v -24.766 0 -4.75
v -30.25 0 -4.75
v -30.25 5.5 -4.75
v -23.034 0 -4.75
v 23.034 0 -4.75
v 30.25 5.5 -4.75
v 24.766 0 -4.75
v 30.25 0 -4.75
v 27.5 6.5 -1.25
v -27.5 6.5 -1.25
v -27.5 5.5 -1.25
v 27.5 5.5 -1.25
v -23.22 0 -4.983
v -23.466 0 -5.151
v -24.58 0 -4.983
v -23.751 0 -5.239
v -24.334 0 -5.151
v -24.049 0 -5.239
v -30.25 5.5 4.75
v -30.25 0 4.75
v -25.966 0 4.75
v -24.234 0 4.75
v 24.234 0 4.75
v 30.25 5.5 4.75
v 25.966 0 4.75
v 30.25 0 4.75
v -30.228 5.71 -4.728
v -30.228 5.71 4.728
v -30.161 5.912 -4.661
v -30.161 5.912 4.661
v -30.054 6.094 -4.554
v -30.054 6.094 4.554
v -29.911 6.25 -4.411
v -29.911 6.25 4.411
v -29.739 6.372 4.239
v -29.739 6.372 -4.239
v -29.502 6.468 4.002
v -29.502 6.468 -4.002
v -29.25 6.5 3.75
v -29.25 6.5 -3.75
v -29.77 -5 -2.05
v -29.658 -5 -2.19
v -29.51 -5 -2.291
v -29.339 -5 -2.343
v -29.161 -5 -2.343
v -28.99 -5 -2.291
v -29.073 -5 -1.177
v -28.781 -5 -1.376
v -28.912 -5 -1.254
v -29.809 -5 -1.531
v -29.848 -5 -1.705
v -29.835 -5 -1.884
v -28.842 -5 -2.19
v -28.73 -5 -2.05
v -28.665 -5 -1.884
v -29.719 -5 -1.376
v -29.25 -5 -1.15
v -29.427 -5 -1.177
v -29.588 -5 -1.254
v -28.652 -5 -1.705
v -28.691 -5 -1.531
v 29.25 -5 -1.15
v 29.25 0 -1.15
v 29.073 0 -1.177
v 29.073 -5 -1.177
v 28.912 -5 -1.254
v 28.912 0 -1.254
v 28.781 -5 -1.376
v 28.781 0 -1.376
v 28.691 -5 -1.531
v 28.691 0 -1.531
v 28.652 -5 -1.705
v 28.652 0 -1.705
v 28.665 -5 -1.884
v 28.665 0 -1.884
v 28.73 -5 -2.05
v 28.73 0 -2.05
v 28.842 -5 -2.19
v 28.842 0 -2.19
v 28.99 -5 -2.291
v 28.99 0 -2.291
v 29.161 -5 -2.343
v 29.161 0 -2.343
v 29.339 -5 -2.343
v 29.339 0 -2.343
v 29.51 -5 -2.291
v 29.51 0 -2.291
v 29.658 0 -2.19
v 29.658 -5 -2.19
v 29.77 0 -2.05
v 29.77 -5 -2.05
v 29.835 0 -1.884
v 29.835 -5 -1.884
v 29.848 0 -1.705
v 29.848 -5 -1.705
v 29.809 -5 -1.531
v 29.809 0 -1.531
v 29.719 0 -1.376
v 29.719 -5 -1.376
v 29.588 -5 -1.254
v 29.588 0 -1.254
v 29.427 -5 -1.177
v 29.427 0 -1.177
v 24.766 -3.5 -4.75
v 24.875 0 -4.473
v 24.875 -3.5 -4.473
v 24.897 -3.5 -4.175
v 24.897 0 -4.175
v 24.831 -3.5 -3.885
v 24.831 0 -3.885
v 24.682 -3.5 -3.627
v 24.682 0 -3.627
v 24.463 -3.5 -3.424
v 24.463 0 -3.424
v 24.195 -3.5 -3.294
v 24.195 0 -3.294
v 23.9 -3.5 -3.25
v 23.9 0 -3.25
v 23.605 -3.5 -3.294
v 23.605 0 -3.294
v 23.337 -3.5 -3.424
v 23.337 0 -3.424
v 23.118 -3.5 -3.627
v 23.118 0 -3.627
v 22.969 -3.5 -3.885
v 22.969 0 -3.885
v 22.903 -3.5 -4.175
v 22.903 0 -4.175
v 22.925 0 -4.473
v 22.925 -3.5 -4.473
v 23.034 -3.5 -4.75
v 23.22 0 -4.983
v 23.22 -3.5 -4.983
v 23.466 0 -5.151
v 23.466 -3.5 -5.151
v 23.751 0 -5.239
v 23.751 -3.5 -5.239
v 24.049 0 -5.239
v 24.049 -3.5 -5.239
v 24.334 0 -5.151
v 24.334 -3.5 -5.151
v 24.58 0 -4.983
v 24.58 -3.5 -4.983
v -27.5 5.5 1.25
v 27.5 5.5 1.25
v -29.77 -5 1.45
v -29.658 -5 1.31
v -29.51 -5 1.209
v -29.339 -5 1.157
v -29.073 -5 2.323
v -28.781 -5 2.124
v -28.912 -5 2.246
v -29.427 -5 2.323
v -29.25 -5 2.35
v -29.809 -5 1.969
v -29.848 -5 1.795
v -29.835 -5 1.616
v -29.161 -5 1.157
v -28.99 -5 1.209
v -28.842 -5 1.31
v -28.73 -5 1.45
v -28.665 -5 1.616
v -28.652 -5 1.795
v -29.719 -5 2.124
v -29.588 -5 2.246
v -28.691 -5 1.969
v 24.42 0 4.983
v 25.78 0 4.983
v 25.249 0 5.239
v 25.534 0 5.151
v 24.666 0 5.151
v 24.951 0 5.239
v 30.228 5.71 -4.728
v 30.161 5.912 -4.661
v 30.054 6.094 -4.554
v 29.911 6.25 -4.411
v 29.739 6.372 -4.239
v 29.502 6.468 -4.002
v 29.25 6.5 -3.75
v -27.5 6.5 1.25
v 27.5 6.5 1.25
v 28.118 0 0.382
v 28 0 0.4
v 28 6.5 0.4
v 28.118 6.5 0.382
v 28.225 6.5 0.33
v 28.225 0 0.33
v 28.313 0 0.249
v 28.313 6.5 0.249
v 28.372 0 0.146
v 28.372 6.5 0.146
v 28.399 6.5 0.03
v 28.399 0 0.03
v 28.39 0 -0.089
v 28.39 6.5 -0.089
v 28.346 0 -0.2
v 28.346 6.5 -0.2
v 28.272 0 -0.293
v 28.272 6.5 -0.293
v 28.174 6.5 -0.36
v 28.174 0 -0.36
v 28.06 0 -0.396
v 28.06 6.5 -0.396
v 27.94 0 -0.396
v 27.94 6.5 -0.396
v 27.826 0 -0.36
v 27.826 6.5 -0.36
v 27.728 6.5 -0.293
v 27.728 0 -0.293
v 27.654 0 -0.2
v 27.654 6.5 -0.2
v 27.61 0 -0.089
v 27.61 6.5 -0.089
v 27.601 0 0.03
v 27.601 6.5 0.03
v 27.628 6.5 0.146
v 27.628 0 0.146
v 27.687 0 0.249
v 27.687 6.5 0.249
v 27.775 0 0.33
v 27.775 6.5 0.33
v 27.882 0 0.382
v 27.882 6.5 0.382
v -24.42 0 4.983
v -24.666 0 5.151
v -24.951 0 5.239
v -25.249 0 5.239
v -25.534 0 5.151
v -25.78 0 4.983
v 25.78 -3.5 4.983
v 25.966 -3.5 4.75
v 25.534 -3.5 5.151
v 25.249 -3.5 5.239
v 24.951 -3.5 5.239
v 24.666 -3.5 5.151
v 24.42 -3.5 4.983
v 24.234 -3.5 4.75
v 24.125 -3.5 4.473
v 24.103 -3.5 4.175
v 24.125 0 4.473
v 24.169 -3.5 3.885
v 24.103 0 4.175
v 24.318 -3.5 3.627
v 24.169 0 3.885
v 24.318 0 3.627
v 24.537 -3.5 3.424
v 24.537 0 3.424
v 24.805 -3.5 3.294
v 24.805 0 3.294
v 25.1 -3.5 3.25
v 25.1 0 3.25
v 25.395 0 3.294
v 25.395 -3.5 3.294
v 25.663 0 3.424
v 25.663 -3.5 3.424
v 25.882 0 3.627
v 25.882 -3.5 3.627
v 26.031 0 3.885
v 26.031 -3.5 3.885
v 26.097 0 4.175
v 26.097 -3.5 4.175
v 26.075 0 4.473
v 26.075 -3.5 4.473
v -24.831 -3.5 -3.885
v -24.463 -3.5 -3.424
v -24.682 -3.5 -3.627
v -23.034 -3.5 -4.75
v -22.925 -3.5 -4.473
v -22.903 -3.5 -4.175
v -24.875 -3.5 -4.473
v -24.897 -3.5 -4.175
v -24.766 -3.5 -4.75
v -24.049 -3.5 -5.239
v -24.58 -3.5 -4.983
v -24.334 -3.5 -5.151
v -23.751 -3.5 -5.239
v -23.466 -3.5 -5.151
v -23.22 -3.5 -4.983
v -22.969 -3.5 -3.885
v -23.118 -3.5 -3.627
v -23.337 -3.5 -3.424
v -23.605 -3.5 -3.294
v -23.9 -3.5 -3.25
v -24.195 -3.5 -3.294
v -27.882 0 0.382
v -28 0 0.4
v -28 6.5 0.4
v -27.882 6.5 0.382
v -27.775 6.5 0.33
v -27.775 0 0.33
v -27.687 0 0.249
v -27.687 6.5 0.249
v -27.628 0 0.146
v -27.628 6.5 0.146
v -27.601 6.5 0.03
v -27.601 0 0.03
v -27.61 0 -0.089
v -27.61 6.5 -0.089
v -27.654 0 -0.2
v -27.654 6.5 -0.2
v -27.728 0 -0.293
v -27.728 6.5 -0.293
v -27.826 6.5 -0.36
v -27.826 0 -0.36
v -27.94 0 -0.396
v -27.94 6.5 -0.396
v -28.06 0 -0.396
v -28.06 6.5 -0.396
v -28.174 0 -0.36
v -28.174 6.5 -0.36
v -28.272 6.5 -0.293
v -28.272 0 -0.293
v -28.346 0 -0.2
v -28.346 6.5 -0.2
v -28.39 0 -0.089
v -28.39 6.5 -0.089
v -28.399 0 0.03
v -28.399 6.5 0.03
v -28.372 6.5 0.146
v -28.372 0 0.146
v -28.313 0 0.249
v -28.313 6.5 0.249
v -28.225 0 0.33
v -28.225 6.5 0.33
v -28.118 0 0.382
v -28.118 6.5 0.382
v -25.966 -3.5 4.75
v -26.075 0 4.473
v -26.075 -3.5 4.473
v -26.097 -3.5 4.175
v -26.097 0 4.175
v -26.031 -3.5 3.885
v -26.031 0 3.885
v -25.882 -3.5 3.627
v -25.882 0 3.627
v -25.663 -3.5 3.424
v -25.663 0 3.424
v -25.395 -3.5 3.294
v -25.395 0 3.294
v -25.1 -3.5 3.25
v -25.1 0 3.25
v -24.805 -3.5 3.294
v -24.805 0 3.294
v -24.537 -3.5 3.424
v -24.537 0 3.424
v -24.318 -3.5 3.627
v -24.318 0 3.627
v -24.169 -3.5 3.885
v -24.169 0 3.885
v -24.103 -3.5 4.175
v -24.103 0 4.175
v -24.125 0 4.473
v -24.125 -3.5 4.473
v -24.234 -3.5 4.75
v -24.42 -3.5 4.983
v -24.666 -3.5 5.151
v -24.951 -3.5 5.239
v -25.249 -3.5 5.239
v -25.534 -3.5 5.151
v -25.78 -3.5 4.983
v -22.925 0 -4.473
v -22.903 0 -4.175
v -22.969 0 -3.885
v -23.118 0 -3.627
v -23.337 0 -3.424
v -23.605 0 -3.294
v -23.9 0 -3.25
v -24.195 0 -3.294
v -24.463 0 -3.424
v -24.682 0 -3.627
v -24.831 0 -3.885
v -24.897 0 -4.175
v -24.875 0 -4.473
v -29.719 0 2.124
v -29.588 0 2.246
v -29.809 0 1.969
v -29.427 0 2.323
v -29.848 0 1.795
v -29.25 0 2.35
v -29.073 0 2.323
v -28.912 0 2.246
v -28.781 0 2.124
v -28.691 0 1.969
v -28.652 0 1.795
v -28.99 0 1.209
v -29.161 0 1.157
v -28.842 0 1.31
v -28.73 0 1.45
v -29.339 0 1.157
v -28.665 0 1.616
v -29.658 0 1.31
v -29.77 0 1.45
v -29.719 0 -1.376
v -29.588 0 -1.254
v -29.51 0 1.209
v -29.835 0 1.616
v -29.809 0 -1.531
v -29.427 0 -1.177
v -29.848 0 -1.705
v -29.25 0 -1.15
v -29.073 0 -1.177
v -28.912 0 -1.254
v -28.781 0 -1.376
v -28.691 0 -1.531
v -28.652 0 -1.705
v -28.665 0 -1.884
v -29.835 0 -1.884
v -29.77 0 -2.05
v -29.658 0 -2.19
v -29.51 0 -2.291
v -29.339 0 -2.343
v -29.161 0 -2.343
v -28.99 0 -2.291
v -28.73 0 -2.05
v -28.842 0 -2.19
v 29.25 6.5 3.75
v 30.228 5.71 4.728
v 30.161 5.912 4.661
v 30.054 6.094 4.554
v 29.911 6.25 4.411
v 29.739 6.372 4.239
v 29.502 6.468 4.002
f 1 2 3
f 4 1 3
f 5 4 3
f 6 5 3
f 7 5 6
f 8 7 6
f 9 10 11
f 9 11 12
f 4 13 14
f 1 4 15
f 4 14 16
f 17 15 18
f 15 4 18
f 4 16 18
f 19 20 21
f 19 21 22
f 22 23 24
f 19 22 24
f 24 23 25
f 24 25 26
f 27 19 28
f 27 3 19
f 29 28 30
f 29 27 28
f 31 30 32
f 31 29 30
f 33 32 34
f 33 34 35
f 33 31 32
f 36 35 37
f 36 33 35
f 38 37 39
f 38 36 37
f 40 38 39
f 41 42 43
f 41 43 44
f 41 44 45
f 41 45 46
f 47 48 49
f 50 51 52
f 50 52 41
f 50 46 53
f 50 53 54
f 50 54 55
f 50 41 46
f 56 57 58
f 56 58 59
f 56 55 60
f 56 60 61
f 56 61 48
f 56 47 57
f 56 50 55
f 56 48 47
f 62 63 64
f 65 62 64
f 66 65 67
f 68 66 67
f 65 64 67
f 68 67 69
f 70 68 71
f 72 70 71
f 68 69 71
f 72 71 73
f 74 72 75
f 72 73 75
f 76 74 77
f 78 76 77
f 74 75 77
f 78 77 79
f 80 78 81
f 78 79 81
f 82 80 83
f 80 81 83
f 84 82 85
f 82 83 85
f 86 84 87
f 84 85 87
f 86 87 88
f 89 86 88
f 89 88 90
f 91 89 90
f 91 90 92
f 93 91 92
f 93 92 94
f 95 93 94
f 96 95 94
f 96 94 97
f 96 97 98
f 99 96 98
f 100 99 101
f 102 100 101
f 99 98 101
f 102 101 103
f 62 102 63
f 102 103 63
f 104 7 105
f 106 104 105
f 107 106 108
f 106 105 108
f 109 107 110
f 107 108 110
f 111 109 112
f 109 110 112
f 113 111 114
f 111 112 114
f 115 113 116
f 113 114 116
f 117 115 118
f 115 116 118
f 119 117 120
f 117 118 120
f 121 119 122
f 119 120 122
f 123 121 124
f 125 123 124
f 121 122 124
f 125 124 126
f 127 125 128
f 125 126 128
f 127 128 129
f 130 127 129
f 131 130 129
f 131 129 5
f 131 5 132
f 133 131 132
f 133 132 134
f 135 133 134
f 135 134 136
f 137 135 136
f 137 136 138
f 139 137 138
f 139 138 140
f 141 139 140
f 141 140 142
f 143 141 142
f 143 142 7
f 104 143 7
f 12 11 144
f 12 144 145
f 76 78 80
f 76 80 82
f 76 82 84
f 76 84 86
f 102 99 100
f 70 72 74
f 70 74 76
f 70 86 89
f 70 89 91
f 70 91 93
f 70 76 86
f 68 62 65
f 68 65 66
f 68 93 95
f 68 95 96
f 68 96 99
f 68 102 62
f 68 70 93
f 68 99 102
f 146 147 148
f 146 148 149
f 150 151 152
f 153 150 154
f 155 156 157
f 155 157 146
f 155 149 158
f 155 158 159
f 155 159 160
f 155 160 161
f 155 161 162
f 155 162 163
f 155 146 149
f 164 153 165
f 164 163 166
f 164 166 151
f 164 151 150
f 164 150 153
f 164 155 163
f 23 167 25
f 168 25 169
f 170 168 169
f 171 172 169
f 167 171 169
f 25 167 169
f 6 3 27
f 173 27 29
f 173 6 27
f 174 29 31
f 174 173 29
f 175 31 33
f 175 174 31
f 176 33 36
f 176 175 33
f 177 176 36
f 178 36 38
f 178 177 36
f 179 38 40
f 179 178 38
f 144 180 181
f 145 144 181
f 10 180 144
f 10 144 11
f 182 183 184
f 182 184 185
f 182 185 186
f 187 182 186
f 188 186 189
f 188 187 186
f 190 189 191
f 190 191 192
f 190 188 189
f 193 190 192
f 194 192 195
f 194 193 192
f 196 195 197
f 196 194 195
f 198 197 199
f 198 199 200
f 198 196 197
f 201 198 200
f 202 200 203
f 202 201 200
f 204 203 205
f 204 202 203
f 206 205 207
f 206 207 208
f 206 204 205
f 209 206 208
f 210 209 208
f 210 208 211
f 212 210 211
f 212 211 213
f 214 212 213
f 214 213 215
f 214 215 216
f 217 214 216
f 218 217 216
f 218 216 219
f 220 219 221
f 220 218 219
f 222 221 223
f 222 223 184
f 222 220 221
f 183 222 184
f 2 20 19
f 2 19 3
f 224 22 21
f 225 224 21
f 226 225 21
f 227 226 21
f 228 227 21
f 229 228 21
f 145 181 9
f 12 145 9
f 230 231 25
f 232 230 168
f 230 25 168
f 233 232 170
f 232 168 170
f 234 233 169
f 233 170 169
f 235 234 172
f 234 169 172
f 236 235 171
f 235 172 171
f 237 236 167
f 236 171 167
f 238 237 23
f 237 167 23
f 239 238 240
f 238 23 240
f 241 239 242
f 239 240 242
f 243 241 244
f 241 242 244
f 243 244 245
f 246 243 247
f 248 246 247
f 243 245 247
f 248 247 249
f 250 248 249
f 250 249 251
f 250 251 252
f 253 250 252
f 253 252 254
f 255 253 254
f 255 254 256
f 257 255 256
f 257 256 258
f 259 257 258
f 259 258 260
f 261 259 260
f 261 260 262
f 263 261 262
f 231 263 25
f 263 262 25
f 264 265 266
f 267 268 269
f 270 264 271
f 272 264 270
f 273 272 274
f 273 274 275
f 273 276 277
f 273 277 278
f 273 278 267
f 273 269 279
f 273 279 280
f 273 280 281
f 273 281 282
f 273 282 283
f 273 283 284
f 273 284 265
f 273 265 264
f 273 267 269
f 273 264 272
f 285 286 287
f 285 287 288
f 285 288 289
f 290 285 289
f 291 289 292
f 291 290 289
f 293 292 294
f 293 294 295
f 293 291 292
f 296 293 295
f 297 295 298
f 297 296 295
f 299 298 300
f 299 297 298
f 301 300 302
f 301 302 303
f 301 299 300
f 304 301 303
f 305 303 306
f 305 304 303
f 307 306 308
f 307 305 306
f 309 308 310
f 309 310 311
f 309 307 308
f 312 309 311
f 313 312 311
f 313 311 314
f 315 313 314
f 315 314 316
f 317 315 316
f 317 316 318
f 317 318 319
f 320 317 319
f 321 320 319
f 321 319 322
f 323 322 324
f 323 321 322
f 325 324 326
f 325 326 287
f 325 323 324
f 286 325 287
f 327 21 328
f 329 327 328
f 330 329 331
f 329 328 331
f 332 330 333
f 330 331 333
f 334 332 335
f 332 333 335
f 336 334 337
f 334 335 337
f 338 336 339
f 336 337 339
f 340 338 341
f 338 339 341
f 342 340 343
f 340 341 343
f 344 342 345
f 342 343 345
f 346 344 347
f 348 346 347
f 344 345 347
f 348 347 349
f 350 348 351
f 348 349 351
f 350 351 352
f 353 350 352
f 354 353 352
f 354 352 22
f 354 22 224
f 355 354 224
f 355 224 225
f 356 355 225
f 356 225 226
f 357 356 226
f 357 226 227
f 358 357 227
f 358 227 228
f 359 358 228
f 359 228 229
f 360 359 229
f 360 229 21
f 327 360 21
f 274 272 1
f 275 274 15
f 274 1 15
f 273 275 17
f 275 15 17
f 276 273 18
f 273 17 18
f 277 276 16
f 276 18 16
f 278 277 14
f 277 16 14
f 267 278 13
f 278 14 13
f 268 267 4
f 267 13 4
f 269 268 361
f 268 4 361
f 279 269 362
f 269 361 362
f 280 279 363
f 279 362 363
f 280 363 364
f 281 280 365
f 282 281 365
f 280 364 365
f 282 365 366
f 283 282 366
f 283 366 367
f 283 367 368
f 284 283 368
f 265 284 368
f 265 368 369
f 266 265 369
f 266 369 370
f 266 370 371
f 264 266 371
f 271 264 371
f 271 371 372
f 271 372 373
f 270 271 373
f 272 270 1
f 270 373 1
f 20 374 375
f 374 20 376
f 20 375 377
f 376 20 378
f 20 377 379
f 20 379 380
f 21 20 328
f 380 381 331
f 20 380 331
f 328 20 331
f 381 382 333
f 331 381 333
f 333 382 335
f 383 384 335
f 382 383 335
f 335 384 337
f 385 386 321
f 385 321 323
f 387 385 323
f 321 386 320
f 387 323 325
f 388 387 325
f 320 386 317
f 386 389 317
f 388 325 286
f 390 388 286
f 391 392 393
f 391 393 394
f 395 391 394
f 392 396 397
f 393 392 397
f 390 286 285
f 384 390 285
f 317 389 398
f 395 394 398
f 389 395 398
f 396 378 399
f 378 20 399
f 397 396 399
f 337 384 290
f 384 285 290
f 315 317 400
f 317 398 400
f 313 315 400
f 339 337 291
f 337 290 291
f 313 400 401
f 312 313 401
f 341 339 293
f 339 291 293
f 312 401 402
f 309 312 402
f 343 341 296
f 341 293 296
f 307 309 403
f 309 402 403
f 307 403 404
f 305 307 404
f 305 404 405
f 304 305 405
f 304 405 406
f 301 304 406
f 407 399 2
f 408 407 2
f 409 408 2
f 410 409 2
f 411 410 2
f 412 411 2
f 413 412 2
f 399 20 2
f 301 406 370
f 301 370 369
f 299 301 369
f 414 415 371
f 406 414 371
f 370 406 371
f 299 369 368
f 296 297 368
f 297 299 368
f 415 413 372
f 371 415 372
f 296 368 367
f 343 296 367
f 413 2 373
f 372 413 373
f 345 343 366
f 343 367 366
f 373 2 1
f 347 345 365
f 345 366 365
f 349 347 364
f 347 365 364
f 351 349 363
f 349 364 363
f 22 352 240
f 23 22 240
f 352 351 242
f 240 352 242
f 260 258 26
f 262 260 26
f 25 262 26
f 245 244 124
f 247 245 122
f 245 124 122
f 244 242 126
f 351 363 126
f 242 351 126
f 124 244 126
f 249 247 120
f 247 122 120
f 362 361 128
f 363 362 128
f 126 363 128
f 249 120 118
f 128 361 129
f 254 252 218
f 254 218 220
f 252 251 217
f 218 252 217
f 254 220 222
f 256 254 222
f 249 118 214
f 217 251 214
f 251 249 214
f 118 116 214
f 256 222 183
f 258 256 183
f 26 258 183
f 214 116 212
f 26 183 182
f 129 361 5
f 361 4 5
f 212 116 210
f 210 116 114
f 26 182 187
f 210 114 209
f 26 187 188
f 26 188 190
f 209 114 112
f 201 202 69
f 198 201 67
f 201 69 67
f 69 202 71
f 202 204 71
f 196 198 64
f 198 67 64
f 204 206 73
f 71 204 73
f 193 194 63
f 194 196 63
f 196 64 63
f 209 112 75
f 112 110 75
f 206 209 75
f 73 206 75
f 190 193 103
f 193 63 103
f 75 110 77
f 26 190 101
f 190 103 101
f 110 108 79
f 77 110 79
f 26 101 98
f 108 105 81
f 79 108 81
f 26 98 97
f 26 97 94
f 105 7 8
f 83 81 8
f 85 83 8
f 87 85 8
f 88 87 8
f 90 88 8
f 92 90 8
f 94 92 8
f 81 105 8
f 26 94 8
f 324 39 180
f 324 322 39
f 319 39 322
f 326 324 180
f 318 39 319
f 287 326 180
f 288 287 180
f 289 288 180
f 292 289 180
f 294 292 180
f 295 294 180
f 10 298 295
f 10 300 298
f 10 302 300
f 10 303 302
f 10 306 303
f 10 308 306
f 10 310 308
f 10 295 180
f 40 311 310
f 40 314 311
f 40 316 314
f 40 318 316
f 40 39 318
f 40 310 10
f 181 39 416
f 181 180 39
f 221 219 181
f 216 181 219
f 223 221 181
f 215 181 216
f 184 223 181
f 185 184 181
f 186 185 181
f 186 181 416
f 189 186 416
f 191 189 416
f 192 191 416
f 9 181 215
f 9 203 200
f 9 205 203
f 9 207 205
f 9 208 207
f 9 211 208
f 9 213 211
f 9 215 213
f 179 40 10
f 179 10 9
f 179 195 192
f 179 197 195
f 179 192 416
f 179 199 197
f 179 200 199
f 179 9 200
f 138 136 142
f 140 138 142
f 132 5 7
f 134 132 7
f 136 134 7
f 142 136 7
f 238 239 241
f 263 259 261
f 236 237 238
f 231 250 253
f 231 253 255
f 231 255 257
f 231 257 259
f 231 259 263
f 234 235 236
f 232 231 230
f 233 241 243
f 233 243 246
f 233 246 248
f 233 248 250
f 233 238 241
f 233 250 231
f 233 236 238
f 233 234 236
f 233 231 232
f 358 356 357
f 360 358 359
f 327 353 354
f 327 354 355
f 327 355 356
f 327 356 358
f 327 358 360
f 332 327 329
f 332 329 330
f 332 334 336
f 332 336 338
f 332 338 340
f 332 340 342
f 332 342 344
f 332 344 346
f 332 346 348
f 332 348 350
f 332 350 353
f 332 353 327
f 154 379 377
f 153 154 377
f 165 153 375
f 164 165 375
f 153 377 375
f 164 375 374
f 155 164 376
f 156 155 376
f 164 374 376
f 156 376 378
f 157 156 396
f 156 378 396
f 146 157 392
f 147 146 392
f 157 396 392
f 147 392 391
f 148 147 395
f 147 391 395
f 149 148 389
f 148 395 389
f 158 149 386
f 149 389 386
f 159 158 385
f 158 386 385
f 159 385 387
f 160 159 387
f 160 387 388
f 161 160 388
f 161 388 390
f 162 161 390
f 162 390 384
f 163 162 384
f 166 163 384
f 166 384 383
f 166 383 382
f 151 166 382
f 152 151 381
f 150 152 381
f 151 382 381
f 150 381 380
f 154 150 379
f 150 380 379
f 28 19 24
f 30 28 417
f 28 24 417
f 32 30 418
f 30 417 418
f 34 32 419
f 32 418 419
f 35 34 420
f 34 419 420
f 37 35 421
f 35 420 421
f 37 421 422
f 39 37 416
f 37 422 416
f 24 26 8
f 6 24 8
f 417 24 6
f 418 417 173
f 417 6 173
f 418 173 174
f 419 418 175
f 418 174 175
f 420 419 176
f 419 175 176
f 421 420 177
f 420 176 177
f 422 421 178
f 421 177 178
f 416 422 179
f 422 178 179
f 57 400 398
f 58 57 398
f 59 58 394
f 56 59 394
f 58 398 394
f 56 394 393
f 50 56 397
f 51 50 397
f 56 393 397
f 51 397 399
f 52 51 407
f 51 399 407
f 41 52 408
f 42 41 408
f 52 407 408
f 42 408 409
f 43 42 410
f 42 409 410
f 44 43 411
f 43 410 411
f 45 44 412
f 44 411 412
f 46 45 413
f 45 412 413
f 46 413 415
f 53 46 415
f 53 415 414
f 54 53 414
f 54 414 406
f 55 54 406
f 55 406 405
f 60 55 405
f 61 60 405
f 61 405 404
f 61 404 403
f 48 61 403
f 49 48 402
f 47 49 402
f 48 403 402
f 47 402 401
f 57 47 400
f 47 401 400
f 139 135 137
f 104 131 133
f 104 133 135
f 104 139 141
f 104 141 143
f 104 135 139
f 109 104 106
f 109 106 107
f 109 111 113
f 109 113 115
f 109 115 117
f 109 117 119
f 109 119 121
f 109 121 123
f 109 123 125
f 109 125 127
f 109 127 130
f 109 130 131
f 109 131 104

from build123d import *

# Parameters (mm, degrees)
SKETCH1_W           = 60.5
SKETCH1_H           = 9.5
SKETCH1_R           = 0.4
BOSS_EXTRUDE1_DEPTH = 6.5
SKETCH2_R           = 1
BOSS_EXTRUDE2_DEPTH = 3.5
SKETCH2_3_R         = 0.6
BOSS_EXTRUDE3_DEPTH = 5
SKETCH4_W           = 55
SKETCH4_H           = 2.5
CUT_EXTRUDE1_DEPTH  = 1
FILLET1_R           = 1


with BuildPart() as part:
    # Sketch1 → Boss-Extrude1 (new body)
    with BuildSketch(Plane(origin=(0, 0, 0), x_dir=(1, 0, 0), z_dir=(0, 1, 0))):
        Rectangle(SKETCH1_W, SKETCH1_H)
        with Locations((-28, 0)):
            Circle(SKETCH1_R, mode=Mode.SUBTRACT)
        with Locations((28, 0)):
            Circle(SKETCH1_R, mode=Mode.SUBTRACT)
    extrude(amount=BOSS_EXTRUDE1_DEPTH)

    # Sketch2 → Boss-Extrude2 (add)
    with BuildSketch(Plane.XZ):
        with Locations((-25.1, 4.25)):
            Circle(SKETCH2_R)
        with Locations((-23.9, -4.25)):
            Circle(SKETCH2_R)
        with Locations((25.1, 4.25)):
            Circle(SKETCH2_R)
        with Locations((23.9, -4.25)):
            Circle(SKETCH2_R)
    extrude(amount=BOSS_EXTRUDE2_DEPTH)

    # Sketch2<3> → Boss-Extrude3 (add)
    with BuildSketch(Plane.XZ):
        with Locations((-29.25, 1.75)):
            Circle(SKETCH2_3_R)
        with Locations((-29.25, -1.75)):
            Circle(SKETCH2_3_R)
        with Locations((29.25, -1.75)):
            Circle(SKETCH2_3_R)
    extrude(amount=BOSS_EXTRUDE3_DEPTH)

    # Sketch4 → Cut-Extrude1 (cut)
    with BuildSketch(Plane(origin=(0, 6.5, 0), x_dir=(1, 0, 0), z_dir=(0, 1, 0))):
        Rectangle(SKETCH4_W, SKETCH4_H)
    extrude(amount=-CUT_EXTRUDE1_DEPTH, mode=Mode.SUBTRACT)

    # Fillet1
    fillet1_edges = [part.edges().sort_by_distance(p)[0] for p in [
        (30.25, 6.5, 0),
        (0, 6.5, -4.75),
        (-30.25, 6.5, 0),
        (0, 6.5, 4.75),
    ]]
    fillet(fillet1_edges, radius=FILLET1_R)


solid = part.part
